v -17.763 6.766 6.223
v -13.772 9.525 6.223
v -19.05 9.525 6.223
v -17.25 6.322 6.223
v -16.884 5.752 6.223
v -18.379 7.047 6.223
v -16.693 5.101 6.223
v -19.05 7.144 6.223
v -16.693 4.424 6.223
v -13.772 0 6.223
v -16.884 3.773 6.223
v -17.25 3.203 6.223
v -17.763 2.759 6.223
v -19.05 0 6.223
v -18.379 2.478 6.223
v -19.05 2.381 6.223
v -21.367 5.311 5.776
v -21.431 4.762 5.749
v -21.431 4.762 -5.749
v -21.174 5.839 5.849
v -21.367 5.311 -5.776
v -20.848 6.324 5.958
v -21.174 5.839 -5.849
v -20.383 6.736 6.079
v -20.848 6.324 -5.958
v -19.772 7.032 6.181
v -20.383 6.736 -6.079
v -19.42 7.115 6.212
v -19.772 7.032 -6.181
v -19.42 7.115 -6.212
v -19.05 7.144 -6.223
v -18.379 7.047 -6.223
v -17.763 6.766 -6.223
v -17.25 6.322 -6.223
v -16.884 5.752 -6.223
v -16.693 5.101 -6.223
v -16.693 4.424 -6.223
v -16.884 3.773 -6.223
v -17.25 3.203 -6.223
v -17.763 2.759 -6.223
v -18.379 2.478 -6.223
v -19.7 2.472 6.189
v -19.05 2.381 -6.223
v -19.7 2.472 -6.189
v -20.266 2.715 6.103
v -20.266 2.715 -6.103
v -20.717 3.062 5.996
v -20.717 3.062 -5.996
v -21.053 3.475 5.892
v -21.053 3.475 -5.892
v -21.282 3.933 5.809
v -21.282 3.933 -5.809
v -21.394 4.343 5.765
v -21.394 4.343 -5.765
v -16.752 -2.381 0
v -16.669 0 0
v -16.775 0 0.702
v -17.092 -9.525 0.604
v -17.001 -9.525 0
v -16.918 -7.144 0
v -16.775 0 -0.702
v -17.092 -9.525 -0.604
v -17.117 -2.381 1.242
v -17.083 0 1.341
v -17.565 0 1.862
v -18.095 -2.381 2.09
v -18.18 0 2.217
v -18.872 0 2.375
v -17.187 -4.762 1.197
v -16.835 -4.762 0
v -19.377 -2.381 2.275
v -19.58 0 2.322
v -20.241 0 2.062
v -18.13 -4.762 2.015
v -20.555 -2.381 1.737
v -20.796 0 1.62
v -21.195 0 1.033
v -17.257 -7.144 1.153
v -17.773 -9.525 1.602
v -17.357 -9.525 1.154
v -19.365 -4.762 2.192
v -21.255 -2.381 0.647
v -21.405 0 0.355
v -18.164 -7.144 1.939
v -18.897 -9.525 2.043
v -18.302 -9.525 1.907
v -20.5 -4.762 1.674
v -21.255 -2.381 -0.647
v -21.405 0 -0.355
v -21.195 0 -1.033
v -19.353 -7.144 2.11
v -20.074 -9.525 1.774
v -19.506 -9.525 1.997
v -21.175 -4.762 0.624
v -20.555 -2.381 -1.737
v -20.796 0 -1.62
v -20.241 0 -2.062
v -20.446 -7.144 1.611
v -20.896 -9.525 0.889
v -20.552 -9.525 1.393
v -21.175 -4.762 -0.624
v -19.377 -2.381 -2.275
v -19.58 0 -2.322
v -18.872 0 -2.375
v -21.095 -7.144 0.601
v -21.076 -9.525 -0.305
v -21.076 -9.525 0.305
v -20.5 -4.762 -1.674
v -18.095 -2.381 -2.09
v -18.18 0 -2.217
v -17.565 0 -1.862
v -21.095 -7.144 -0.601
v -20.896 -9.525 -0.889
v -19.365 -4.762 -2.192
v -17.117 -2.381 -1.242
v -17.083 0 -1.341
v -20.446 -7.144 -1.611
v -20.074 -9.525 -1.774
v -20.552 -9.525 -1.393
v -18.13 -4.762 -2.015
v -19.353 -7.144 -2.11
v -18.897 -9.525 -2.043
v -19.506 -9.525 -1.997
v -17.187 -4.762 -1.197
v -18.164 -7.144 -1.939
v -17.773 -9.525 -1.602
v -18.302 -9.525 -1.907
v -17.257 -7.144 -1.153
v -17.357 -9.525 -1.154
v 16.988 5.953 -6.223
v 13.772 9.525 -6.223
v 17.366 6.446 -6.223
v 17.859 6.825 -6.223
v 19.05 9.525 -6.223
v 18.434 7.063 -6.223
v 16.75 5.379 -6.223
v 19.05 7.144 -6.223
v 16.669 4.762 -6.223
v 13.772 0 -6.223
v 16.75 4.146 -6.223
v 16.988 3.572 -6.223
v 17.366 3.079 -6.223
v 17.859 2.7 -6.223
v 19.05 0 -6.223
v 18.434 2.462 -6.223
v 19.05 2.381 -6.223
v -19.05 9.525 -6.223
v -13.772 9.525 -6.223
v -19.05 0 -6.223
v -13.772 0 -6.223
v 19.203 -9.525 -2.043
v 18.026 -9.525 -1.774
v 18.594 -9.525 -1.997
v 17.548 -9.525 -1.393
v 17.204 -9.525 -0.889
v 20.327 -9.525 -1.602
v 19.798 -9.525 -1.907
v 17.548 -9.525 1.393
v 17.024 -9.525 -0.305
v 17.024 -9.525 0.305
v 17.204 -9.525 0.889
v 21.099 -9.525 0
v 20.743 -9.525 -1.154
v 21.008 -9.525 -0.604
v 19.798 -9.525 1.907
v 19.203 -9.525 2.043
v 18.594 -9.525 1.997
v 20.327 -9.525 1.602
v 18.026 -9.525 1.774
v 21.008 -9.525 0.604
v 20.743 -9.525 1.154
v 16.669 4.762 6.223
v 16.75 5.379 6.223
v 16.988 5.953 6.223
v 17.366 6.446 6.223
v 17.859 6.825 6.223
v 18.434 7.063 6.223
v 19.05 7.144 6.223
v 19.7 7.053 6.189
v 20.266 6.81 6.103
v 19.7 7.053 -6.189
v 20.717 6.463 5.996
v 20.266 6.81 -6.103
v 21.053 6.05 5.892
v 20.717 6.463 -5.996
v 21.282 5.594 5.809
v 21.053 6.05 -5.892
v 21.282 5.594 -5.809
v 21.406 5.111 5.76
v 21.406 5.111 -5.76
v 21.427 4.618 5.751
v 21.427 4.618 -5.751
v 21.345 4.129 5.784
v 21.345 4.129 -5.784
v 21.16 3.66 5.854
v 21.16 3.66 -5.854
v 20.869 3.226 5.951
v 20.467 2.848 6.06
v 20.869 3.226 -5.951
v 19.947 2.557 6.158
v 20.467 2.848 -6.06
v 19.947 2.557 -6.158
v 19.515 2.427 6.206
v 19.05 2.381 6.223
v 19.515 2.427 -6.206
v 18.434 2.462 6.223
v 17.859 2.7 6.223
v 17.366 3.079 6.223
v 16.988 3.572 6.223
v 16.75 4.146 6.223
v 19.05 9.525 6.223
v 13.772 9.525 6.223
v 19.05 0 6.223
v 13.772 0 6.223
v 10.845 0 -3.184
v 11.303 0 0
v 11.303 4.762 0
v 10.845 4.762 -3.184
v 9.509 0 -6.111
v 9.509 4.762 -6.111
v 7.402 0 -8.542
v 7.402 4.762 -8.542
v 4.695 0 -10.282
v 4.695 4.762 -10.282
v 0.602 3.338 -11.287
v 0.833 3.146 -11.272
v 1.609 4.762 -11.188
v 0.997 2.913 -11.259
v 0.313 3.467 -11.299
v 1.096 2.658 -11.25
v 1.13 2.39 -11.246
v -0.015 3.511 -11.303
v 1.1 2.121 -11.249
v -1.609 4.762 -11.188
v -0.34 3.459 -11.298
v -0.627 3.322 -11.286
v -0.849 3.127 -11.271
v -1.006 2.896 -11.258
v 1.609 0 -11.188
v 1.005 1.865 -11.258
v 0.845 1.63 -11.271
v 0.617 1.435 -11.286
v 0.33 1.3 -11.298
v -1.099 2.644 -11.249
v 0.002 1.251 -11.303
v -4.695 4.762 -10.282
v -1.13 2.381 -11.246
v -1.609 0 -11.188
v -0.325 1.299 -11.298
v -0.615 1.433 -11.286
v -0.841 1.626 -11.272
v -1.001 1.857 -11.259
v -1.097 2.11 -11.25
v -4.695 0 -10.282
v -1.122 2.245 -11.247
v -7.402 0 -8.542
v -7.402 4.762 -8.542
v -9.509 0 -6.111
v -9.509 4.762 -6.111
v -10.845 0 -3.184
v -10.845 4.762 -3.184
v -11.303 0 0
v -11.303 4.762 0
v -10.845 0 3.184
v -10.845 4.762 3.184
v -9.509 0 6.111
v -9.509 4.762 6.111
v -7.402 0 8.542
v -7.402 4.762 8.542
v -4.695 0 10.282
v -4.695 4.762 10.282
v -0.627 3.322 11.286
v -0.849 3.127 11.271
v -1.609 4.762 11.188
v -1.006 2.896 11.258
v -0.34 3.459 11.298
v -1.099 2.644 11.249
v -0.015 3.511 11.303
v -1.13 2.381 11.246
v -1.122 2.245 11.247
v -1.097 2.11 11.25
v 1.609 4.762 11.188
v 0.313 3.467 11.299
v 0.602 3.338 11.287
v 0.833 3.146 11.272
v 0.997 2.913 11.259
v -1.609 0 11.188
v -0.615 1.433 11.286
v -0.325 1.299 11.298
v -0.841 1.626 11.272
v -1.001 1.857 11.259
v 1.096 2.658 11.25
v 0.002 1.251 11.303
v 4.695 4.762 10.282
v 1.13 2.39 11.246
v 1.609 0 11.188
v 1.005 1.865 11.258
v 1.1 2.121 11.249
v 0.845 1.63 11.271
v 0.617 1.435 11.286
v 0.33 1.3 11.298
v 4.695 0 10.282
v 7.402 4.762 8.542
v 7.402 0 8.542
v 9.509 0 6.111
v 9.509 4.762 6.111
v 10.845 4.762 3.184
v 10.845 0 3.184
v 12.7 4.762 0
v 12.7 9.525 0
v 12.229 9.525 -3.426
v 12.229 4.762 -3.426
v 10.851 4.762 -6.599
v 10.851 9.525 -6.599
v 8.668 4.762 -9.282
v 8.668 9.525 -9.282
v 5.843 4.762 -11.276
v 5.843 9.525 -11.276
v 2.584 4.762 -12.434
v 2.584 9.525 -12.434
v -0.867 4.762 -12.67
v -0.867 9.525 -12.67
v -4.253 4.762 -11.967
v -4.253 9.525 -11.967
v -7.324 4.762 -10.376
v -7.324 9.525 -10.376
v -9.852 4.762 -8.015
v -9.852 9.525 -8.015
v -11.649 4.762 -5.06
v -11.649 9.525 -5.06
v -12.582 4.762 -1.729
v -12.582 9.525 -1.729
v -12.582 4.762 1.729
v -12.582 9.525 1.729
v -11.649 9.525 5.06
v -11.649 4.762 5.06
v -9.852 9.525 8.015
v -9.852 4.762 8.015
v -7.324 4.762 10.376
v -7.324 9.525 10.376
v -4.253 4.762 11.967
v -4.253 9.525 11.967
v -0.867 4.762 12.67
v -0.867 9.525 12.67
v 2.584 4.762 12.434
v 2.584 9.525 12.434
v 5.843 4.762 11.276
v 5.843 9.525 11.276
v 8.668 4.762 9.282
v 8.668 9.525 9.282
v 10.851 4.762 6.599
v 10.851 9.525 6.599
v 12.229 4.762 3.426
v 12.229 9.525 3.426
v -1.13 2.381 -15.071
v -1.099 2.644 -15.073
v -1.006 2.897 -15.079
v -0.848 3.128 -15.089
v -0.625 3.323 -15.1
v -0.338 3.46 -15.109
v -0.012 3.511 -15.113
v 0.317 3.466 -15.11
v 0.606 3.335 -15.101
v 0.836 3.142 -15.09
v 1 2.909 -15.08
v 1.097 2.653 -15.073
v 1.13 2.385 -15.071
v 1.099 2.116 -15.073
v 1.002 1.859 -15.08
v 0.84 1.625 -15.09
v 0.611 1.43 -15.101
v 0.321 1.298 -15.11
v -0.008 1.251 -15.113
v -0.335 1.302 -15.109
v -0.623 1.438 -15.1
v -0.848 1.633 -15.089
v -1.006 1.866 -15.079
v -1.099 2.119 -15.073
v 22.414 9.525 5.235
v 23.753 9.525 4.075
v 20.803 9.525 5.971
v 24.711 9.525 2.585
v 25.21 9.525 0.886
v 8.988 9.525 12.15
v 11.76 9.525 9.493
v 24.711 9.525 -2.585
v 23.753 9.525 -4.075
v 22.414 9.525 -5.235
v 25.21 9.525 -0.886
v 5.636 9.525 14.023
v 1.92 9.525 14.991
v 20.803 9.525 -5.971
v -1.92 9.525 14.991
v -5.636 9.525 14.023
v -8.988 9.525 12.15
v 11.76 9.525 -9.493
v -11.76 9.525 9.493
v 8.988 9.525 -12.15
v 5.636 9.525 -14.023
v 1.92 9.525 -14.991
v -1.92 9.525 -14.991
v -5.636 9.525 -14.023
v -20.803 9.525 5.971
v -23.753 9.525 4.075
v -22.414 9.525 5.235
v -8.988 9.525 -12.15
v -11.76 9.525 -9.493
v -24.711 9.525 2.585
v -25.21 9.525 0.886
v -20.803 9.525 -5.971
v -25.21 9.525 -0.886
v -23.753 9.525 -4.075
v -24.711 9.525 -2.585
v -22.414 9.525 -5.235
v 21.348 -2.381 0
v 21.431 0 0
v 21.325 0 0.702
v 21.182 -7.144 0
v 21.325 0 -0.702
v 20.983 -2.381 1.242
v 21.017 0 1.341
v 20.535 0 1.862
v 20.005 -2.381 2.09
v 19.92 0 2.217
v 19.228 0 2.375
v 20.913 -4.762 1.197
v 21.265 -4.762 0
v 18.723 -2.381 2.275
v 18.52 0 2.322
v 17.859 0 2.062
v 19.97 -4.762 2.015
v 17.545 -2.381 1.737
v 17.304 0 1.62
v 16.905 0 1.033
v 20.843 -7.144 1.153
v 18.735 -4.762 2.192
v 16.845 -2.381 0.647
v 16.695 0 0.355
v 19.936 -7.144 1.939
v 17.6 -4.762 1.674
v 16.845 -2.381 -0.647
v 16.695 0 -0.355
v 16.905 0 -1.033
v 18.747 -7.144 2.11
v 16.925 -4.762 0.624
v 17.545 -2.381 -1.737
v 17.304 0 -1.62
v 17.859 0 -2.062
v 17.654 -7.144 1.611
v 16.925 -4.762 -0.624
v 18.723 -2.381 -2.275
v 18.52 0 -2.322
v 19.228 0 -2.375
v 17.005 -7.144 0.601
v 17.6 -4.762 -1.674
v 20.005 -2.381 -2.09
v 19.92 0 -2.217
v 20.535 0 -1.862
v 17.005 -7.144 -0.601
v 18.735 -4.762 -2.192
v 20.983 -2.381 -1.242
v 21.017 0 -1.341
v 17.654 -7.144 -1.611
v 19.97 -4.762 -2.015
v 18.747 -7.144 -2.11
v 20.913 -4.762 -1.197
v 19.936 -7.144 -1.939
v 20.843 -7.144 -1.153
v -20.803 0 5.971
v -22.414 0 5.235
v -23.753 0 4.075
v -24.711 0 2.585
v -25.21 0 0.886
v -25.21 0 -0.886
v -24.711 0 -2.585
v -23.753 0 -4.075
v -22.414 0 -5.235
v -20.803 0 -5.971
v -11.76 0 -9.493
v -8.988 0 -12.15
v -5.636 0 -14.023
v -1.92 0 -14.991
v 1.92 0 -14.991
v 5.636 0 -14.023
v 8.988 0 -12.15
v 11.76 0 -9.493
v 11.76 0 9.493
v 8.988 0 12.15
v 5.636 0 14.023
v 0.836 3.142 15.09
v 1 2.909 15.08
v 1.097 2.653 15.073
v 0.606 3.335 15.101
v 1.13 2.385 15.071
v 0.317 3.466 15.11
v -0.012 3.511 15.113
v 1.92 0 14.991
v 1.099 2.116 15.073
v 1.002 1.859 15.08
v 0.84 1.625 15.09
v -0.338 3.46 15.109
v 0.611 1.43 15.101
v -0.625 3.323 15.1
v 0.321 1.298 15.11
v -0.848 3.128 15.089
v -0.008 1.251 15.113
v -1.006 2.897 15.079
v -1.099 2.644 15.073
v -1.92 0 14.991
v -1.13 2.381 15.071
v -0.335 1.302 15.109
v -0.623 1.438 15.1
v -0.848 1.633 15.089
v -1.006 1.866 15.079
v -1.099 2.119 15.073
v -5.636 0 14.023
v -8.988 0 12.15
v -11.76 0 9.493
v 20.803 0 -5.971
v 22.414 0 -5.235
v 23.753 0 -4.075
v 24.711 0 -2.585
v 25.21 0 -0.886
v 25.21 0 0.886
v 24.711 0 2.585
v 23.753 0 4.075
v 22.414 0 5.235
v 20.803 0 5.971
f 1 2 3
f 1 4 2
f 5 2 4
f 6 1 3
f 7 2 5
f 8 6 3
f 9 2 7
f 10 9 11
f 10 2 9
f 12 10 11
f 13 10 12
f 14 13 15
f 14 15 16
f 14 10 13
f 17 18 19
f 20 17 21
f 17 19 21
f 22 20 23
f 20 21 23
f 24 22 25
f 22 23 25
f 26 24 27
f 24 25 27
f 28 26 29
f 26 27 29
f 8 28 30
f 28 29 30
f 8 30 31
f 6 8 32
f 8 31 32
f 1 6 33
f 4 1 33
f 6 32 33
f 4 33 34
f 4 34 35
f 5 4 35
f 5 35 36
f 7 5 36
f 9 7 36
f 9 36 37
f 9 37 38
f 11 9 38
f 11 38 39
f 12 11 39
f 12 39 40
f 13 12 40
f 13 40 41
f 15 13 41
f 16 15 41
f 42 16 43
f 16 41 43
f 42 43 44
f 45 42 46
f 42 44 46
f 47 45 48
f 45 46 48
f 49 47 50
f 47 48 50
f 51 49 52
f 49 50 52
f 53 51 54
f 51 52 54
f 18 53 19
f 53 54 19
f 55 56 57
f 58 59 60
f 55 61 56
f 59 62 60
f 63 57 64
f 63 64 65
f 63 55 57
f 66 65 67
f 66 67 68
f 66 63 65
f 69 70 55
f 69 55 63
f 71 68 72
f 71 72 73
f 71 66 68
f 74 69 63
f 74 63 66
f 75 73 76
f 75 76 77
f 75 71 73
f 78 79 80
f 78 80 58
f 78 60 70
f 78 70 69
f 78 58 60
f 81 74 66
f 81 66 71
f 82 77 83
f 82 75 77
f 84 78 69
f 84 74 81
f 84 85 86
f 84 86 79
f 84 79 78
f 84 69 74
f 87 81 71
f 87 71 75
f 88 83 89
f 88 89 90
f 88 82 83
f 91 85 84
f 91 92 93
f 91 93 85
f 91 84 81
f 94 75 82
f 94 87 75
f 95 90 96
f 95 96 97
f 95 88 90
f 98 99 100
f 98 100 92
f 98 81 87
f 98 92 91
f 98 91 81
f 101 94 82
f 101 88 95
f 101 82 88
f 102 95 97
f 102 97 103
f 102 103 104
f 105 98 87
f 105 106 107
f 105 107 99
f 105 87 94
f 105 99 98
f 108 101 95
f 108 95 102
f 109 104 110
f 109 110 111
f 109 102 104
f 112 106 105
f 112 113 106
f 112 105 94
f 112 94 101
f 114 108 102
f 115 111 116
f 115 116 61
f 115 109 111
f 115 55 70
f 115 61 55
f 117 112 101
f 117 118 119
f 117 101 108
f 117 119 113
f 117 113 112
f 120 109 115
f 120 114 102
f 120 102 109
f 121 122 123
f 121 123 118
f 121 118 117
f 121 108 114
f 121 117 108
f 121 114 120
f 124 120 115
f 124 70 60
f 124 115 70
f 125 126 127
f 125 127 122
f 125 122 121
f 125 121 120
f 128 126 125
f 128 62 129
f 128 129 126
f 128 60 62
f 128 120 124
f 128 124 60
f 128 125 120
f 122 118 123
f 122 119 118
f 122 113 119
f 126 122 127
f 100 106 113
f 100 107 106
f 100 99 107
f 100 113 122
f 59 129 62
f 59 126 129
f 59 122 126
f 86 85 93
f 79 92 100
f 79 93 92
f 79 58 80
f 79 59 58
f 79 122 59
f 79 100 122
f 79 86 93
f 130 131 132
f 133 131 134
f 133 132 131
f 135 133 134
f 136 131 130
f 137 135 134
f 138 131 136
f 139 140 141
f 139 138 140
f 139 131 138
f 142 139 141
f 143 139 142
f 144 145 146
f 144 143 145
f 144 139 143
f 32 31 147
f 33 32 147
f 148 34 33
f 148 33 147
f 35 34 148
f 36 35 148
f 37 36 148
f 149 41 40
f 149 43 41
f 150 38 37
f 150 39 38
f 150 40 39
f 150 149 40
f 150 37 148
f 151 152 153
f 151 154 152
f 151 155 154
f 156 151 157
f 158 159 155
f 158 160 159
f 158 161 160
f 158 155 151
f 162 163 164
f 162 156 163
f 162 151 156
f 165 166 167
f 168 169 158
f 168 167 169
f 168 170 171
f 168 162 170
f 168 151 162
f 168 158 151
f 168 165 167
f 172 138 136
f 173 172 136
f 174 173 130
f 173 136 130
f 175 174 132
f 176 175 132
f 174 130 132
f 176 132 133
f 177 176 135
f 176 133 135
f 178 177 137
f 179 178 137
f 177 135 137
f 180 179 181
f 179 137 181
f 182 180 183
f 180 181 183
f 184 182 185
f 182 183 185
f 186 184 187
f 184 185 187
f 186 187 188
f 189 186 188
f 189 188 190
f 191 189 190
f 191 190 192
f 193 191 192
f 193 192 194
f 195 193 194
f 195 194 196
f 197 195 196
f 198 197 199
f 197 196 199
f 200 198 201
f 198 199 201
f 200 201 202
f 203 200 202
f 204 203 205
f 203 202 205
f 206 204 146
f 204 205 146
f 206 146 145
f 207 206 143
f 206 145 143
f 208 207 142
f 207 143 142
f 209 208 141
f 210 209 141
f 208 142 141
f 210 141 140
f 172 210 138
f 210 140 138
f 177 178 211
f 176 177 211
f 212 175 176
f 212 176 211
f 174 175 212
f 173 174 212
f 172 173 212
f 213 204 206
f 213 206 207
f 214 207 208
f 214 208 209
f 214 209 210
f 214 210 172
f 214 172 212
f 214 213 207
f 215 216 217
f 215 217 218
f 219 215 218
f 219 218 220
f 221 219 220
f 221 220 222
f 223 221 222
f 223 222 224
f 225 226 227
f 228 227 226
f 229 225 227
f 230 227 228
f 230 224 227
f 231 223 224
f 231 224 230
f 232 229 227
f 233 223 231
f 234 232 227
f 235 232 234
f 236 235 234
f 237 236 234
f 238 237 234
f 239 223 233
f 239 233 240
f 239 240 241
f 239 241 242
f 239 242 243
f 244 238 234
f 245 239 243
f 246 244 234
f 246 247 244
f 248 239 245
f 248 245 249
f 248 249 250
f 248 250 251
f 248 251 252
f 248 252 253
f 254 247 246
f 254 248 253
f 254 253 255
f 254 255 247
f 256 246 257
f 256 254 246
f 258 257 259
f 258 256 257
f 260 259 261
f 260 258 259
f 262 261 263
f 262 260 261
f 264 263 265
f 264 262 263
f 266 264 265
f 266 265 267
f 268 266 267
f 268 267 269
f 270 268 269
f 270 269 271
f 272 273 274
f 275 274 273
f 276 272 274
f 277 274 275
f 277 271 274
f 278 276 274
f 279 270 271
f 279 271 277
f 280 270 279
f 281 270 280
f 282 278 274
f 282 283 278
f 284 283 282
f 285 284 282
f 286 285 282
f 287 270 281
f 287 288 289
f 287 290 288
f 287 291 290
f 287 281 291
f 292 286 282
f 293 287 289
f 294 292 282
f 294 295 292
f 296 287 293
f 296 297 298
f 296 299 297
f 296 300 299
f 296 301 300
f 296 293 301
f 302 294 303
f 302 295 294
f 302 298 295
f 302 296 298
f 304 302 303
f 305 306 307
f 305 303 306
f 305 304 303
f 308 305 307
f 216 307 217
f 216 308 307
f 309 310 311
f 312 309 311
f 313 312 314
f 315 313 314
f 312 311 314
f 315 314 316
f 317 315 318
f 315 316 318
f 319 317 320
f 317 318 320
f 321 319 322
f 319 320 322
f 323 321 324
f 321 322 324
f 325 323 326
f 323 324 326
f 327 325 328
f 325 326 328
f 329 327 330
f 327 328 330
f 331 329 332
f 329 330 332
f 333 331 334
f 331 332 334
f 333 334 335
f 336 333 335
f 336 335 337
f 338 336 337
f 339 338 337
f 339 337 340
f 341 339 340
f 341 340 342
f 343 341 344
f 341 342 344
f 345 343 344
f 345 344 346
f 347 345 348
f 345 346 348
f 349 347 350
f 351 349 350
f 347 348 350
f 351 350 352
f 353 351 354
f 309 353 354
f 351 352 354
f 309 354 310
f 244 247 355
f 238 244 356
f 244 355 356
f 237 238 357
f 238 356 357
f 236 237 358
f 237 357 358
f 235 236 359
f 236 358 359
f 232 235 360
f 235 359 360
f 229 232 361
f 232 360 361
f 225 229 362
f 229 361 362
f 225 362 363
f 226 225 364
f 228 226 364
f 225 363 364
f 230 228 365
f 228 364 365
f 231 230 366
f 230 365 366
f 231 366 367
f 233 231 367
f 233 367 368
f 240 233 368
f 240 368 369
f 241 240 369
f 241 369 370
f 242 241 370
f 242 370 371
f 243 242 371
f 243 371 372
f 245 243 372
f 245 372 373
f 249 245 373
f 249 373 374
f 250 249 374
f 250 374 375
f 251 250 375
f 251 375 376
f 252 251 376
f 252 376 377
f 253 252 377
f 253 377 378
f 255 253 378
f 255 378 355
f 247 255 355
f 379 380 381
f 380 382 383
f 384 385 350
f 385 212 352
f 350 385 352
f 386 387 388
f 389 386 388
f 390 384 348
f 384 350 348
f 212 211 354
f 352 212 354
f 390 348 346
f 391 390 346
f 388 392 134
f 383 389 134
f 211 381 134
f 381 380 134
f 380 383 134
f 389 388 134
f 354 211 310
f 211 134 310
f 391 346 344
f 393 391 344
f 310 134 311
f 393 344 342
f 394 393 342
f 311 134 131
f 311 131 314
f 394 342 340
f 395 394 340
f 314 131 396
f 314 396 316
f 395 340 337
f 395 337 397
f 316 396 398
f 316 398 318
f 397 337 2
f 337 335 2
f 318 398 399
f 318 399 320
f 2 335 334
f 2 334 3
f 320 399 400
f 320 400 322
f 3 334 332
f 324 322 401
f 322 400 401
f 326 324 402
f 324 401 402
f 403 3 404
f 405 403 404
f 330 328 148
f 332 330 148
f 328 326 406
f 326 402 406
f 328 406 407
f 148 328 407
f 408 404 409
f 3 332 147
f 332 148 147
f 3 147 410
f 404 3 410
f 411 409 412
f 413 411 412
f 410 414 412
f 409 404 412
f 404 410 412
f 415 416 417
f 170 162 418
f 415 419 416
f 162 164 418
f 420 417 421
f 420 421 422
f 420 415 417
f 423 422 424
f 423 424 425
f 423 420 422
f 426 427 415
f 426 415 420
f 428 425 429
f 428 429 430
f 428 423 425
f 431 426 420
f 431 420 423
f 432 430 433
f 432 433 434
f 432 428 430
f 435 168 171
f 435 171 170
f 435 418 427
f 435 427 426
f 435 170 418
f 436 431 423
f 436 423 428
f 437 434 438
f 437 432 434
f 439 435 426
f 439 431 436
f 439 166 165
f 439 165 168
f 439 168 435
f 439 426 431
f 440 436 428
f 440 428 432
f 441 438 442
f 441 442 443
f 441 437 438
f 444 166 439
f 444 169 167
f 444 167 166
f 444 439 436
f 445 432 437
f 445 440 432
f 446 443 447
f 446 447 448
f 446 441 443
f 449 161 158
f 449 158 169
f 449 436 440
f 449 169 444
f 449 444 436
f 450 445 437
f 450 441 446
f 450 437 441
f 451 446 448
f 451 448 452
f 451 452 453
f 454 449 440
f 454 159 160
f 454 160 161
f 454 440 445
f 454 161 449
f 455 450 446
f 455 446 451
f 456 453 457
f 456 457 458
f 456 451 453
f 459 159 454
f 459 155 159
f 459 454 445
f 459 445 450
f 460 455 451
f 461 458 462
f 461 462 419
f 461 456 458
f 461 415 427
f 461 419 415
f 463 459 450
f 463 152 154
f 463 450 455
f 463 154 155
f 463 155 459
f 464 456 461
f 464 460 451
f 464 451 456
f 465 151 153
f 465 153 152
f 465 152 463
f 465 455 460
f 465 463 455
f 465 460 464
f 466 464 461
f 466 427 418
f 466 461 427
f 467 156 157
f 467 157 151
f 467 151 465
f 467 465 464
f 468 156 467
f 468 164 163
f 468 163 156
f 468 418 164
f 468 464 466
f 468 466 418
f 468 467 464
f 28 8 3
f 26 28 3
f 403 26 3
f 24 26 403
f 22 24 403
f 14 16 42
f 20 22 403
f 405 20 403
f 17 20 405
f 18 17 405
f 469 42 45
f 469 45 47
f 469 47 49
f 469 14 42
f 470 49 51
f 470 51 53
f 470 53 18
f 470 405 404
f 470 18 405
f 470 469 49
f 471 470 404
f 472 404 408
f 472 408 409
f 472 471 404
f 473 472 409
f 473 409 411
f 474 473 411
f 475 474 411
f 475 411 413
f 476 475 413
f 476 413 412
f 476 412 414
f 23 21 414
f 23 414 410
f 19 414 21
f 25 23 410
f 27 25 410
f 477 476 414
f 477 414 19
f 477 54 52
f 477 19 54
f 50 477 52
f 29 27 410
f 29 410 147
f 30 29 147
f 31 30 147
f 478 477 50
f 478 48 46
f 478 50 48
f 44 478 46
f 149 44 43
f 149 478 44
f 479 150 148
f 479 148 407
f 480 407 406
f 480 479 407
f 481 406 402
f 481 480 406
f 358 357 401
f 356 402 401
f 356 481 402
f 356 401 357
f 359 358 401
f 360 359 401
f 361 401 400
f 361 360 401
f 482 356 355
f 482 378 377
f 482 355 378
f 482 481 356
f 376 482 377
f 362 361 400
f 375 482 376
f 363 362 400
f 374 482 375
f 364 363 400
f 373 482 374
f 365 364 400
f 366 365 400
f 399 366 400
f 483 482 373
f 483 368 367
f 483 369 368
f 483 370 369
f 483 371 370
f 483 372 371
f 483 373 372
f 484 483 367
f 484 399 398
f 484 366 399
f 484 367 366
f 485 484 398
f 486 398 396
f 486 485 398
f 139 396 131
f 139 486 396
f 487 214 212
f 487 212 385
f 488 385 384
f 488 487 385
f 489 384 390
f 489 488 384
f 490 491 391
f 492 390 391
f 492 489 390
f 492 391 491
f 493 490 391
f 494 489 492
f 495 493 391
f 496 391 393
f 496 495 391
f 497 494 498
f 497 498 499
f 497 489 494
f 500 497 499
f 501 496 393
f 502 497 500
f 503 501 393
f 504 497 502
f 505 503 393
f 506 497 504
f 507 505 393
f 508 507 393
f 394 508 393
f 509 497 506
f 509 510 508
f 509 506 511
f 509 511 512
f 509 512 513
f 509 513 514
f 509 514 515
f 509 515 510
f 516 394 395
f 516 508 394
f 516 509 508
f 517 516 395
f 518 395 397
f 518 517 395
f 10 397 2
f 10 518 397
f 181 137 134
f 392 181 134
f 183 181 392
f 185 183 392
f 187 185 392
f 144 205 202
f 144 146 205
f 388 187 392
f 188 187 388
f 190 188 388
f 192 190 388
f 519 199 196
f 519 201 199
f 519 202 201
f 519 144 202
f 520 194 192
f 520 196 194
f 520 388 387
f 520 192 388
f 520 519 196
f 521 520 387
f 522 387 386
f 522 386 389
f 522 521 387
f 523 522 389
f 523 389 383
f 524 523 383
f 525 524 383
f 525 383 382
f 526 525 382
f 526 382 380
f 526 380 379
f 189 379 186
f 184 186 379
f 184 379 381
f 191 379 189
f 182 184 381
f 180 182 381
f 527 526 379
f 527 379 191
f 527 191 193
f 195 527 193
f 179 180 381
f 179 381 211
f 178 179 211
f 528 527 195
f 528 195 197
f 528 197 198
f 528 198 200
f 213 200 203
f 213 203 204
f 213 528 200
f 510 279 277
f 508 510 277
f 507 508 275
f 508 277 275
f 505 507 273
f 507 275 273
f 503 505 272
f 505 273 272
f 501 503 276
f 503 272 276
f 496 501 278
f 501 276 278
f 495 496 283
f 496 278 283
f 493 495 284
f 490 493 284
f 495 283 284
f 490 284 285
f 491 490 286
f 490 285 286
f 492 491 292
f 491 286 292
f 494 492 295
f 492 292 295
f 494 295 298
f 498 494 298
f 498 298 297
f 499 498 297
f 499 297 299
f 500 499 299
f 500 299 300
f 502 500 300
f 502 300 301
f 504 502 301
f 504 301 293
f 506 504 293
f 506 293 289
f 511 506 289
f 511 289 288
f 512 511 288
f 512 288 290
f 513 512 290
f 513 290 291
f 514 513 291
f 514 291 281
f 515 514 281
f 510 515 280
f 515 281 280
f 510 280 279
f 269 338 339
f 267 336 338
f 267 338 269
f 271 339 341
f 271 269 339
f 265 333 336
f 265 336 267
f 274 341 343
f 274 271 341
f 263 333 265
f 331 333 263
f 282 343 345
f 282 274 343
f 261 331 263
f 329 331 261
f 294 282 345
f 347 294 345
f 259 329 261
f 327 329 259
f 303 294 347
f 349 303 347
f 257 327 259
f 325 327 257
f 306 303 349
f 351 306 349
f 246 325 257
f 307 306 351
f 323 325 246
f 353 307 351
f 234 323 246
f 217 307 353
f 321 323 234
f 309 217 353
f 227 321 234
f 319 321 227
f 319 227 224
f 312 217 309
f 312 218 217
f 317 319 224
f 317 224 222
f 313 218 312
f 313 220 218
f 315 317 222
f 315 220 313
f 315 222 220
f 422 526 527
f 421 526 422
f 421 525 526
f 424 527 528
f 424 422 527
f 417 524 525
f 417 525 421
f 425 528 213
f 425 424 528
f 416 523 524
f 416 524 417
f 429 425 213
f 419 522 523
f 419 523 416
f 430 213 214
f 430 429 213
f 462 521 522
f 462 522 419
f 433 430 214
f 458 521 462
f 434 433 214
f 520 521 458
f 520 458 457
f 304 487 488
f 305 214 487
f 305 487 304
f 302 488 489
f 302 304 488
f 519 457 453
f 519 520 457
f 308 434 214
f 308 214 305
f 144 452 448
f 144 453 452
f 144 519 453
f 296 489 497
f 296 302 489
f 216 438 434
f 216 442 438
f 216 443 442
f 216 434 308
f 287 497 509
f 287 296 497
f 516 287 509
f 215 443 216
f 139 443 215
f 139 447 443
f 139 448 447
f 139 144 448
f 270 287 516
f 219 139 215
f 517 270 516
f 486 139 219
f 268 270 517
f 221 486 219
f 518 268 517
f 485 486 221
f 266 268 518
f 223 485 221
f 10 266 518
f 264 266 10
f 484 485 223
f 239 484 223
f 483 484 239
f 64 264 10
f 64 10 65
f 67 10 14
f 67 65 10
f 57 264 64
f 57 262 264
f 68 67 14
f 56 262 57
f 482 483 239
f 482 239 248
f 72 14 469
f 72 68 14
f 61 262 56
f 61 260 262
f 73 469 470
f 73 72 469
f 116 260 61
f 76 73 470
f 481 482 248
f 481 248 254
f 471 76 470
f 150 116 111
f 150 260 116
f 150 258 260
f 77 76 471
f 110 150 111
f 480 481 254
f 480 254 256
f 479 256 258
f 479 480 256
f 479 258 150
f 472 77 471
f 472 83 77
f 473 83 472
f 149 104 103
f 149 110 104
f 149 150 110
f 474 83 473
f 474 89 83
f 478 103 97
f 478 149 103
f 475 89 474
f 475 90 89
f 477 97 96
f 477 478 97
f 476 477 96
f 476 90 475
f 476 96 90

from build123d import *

# Parameters (mm, degrees)
SKETCH1_R                          = 11.303
BOSS_EXTRUDE1_DEPTH                = 9.525
F_4_40_TAPPED_HOLE1_D              = 2.2606
SKETCH10_R                         = 2.38125
BOSS_EXTRUDE2_DEPTH                = 9.525
BOSS_EXTRUDE2_TAPER                = 2
F_3_16_0_1875_DIAMETER_HOLE1_D     = 4.7625
F_3_16_0_1875_DIAMETER_HOLE1_DEPTH = 25.4
F_3_16_0_1875_DIAMETER_HOLE1_TIP   = 1.430799349
SKETCH14_R                         = 12.7
CUT_EXTRUDE1_DEPTH                 = 4.7625


with BuildPart() as part:
    # Sketch1 → Boss-Extrude1 (new body)
    with BuildSketch(Plane(origin=(0, 0, 0), x_dir=(1, 0, 0), z_dir=(0, 1, 0))):
        with BuildLine():
            Line((-19.05, 6.223), (-13.772328779, 6.223))
            ThreePointArc((-13.772328779, 6.223), (0, 15.113), (13.772328779, 6.223))
            Line((13.772328779, 6.223), (19.05, 6.223))
            ThreePointArc((19.05, 6.223), (25.273, 0), (19.05, -6.223))
            Line((19.05, -6.223), (13.772328779, -6.223))
            ThreePointArc((13.772328779, -6.223), (0, -15.113), (-13.772328779, -6.223))
            Line((-13.772328779, -6.223), (-19.05, -6.223))
            ThreePointArc((-19.05, -6.223), (-25.273, 0), (-19.05, 6.223))
        make_face()
        Circle(SKETCH1_R, mode=Mode.SUBTRACT)
    extrude(amount=BOSS_EXTRUDE1_DEPTH)

    # #4-40 Tapped Hole1 (through all)
    with Locations(Plane.XY.offset(15.113)):
        with Locations((0, 2.38125)):
            Hole(F_4_40_TAPPED_HOLE1_D / 2)

    # Sketch10 → Boss-Extrude2 (add)
    with BuildSketch(Plane.XZ):
        with Locations((-19.05, 0)):
            Circle(SKETCH10_R)
        with Locations((19.05, 0)):
            Circle(SKETCH10_R)
    extrude(amount=BOSS_EXTRUDE2_DEPTH, taper=BOSS_EXTRUDE2_TAPER)

    # 3/16 (0.1875) Diameter Hole1
    with Locations(Plane.XY.offset(6.223)):
        with Locations((-19.05, 4.7625), (19.05, 4.7625)):
            Hole(F_3_16_0_1875_DIAMETER_HOLE1_D / 2, depth=F_3_16_0_1875_DIAMETER_HOLE1_DEPTH)
            with Locations((0, 0, -(F_3_16_0_1875_DIAMETER_HOLE1_DEPTH + F_3_16_0_1875_DIAMETER_HOLE1_TIP / 2))):  # 118° drill point
                Cone(0, F_3_16_0_1875_DIAMETER_HOLE1_D / 2, F_3_16_0_1875_DIAMETER_HOLE1_TIP, mode=Mode.SUBTRACT)

    # Sketch14 → Cut-Extrude1 (cut)
    with BuildSketch(Plane(origin=(0, 9.525, 0), x_dir=(1, 0, 0), z_dir=(0, 1, 0))):
        Circle(SKETCH14_R)
    extrude(amount=-CUT_EXTRUDE1_DEPTH, mode=Mode.SUBTRACT)


solid = part.part
